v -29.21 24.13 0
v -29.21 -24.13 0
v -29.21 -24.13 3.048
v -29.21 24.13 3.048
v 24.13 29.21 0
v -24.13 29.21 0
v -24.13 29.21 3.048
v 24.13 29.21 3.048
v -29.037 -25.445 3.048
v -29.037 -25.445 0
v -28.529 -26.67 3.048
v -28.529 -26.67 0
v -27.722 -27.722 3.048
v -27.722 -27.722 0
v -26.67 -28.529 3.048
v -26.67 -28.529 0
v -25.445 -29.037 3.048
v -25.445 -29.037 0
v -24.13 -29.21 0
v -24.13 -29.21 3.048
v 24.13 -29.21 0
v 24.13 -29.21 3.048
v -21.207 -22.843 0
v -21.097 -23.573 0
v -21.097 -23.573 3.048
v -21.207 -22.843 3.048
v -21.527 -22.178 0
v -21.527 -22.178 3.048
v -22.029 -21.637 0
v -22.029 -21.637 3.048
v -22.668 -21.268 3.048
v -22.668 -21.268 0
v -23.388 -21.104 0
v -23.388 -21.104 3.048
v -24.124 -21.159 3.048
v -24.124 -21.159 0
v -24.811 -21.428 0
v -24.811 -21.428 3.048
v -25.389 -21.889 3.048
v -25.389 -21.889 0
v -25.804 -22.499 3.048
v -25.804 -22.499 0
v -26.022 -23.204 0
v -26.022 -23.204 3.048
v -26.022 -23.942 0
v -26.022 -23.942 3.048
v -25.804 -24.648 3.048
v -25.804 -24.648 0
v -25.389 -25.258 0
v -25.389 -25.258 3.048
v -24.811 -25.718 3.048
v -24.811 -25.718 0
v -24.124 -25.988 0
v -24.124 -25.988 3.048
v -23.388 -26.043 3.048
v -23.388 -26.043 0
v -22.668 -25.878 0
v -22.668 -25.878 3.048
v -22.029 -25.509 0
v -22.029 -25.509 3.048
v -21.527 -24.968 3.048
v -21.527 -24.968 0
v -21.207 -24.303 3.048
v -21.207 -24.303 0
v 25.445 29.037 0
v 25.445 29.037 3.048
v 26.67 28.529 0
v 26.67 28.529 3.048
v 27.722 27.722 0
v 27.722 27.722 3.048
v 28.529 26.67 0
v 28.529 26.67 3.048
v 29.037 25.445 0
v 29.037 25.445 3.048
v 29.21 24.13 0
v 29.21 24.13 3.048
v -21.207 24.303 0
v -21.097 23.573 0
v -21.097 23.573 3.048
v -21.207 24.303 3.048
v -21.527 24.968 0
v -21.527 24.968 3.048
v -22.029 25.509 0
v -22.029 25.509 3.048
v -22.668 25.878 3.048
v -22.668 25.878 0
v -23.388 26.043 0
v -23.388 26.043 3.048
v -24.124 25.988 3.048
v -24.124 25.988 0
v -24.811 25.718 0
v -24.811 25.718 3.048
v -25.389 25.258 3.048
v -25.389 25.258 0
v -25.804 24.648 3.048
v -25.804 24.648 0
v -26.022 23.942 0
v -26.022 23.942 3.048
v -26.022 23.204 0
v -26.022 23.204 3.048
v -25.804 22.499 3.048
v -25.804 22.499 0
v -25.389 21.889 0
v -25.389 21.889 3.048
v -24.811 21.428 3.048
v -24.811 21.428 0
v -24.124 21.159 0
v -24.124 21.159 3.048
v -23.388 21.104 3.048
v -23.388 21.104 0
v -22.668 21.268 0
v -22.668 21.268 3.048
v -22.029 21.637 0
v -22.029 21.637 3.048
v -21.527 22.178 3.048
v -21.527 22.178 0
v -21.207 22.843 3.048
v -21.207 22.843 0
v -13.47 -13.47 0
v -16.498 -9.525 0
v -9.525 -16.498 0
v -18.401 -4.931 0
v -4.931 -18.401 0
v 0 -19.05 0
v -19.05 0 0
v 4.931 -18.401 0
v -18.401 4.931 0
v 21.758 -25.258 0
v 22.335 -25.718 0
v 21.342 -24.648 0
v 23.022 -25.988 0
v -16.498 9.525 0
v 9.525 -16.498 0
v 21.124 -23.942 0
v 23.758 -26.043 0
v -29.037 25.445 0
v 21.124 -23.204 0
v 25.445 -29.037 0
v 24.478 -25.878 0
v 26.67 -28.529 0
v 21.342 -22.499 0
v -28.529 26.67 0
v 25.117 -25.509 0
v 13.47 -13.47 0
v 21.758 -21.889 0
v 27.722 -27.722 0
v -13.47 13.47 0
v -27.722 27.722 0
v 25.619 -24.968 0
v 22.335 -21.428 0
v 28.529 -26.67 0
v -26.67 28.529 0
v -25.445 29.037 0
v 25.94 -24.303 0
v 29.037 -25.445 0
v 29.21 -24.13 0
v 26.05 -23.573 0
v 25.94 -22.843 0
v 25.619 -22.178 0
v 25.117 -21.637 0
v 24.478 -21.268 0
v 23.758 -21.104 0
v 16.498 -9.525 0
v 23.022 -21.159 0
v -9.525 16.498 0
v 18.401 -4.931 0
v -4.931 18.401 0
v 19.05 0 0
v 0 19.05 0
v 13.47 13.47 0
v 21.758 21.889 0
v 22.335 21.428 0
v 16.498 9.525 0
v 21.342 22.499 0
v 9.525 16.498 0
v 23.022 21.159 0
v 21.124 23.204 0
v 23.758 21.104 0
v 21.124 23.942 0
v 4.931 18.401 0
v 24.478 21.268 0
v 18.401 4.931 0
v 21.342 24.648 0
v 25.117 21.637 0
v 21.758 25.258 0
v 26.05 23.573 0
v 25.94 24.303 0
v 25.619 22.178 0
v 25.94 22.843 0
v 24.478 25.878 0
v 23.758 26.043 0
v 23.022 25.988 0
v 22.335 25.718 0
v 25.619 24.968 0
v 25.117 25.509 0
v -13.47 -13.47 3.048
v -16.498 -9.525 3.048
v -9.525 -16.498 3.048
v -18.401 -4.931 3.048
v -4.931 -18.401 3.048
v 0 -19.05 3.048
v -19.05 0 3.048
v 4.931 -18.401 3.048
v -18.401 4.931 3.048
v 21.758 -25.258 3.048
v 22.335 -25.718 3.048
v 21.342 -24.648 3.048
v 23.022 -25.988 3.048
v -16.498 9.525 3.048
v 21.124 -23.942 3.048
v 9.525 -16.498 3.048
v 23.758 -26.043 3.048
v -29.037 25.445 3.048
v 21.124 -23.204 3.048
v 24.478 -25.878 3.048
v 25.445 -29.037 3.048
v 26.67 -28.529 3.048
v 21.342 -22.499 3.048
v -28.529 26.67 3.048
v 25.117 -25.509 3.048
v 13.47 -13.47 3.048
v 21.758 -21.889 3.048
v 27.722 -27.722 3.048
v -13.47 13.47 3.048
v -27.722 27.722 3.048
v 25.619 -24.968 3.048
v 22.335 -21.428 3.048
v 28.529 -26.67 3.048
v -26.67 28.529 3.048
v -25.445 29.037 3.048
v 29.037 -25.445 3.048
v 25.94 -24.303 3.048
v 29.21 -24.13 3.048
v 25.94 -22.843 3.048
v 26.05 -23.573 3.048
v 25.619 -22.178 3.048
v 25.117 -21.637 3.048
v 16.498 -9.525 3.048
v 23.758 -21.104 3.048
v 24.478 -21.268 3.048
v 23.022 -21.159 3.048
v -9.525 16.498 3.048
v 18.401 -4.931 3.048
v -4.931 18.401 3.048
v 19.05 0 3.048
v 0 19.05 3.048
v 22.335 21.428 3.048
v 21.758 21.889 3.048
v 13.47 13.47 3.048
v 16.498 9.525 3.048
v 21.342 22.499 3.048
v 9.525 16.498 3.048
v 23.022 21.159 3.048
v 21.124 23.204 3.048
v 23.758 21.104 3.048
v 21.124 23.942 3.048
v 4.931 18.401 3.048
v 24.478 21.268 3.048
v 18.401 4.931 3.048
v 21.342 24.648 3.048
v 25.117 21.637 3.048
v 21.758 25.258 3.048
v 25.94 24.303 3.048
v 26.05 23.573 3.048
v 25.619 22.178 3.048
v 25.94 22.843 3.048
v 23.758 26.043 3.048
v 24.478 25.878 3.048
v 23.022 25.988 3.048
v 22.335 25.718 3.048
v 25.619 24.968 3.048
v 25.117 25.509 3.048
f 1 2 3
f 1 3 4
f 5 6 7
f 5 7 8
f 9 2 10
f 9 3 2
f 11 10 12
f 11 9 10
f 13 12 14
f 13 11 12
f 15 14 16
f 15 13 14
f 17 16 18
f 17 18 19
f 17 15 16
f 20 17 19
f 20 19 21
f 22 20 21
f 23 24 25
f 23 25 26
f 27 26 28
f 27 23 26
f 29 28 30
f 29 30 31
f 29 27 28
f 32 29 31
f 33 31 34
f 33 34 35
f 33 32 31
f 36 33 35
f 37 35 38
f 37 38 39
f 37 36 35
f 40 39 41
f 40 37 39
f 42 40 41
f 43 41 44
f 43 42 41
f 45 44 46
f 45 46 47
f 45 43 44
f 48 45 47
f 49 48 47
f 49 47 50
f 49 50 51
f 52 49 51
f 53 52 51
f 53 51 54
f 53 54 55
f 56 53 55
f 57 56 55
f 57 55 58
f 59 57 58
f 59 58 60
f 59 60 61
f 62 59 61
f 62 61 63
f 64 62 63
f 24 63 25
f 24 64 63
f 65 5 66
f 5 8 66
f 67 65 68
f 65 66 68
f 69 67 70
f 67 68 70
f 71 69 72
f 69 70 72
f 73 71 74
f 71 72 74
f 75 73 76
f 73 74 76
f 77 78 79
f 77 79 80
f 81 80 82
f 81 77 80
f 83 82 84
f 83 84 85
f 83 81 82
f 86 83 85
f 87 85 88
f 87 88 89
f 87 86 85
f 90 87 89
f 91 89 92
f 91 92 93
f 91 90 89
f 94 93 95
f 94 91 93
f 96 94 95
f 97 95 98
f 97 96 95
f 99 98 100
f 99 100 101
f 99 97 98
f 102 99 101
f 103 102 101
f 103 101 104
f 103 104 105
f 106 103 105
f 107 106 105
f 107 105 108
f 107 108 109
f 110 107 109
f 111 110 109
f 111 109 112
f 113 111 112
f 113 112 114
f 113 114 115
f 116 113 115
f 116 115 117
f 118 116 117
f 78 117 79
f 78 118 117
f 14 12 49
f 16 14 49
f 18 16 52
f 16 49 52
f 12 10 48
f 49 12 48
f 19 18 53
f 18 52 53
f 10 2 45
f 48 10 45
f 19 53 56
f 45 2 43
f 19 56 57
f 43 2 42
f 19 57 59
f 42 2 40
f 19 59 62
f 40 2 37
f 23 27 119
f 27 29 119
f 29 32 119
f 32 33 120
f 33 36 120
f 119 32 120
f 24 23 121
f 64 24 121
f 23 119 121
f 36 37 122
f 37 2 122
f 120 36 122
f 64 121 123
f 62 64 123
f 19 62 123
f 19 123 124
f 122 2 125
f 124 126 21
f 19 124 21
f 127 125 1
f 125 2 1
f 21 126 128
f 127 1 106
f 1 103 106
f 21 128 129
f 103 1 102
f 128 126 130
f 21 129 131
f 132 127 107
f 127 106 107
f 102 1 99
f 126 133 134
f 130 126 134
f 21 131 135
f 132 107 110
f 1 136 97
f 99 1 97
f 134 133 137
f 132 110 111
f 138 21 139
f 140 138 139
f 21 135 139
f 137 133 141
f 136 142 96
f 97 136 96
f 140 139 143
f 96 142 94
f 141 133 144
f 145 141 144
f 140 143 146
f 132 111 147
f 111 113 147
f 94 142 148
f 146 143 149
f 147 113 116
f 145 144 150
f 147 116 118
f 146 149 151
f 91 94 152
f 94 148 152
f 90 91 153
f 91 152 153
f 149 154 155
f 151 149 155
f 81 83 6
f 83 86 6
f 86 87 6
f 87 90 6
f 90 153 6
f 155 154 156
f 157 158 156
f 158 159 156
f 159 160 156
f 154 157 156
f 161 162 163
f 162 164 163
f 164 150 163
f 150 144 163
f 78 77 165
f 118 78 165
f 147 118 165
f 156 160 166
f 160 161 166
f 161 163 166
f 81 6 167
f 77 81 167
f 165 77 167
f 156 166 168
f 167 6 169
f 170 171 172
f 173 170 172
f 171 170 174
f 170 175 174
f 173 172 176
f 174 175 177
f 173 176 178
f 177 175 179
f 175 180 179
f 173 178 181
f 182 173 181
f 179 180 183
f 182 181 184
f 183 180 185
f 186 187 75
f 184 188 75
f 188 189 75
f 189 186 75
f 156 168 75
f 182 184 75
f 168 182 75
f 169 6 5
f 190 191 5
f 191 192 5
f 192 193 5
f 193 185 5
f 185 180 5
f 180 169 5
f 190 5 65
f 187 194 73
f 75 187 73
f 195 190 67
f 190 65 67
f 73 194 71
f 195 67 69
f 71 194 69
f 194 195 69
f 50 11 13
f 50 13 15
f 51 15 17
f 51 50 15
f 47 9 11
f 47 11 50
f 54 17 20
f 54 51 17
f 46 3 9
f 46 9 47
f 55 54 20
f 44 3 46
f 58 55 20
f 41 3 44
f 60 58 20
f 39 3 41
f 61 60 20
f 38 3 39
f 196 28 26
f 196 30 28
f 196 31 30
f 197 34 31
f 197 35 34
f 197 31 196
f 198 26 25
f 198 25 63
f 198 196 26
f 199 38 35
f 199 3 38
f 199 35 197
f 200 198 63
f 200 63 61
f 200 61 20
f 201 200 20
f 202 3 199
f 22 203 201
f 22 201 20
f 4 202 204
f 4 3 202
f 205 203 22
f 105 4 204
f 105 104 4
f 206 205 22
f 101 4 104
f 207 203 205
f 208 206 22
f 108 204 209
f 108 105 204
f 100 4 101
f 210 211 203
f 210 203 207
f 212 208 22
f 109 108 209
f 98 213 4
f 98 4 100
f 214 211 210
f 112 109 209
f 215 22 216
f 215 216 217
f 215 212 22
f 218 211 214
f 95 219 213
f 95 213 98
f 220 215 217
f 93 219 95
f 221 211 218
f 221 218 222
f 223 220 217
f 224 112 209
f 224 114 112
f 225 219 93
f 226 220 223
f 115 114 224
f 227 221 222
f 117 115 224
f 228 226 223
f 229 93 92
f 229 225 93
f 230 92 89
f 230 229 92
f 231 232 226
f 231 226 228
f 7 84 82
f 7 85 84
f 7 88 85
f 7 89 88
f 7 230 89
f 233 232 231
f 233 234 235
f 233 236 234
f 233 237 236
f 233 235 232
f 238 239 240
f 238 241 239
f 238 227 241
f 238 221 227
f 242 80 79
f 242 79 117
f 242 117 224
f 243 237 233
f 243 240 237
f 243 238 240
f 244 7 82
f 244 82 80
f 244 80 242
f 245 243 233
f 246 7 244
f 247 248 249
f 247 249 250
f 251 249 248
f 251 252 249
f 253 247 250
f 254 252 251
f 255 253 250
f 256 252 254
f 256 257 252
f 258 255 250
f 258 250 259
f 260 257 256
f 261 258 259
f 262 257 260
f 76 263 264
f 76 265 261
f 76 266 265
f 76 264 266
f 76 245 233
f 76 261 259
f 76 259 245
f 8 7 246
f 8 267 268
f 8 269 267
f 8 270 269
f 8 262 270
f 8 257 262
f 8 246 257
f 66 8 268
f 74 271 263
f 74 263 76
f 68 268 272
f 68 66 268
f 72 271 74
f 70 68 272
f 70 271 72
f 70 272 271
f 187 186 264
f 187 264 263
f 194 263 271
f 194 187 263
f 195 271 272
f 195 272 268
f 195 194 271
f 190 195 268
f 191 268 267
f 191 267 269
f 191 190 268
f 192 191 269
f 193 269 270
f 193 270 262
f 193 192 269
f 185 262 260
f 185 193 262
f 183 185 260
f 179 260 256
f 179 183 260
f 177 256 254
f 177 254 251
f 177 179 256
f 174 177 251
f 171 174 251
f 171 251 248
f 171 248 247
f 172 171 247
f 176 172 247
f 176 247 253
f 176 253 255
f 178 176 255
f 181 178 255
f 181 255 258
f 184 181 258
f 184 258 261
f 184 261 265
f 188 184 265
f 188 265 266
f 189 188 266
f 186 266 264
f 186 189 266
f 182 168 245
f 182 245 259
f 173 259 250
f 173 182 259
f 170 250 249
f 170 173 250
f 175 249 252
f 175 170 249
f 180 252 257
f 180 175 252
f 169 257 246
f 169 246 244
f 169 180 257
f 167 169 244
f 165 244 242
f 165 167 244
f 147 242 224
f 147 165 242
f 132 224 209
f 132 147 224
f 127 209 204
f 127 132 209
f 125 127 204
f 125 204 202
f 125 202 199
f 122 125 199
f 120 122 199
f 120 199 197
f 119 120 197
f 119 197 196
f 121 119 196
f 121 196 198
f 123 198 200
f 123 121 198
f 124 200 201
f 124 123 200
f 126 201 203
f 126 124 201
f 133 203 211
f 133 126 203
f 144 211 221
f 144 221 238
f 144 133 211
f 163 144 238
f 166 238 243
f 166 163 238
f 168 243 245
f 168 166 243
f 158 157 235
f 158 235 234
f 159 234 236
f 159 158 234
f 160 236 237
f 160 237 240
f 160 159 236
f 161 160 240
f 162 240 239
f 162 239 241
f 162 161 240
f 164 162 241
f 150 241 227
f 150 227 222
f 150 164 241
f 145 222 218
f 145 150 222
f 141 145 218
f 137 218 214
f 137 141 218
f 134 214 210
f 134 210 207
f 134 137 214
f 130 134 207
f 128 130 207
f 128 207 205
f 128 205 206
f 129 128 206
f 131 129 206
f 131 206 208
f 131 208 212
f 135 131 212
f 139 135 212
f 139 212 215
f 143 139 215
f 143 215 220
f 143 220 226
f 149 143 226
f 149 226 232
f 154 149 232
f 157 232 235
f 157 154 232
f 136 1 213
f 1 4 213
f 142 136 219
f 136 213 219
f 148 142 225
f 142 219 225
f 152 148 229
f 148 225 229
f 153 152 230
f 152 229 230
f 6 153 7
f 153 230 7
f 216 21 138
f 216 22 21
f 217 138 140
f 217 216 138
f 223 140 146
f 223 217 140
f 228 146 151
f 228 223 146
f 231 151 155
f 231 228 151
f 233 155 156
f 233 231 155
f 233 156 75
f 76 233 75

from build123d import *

# Parameters (mm, degrees)
F0_W     = 58.42
F0_H     = 58.42
F0_R     = 2.4765
F0_R_2   = 19.05
F1_DEPTH = 3.048
F2_R     = 5.08
F3_R     = 5.08


with BuildPart() as f1:
    # F0 (on Top) → F1 (new body)
    with BuildSketch(Plane.XY):
        Rectangle(F0_W, F0_H)
        with Locations((-23.573172, -23.573172)):
            Circle(F0_R, mode=Mode.SUBTRACT)
        Circle(F0_R_2, mode=Mode.SUBTRACT)
        with Locations((23.573172, -23.573172)):
            Circle(F0_R, mode=Mode.SUBTRACT)
        with Locations((-23.573172, 23.573172)):
            Circle(F0_R, mode=Mode.SUBTRACT)
        with Locations((23.573172, 23.573172)):
            Circle(F0_R, mode=Mode.SUBTRACT)
    extrude(amount=F1_DEPTH)

    # F2
    f2_edges = [f1.edges().sort_by_distance(p)[0] for p in [
        (-29.21, 29.21, 1.524),
    ]]
    fillet(f2_edges, radius=F2_R)

    # F3
    f3_edges = [f1.edges().sort_by_distance(p)[0] for p in [
        (29.21, 29.21, 1.524),
        (29.21, -29.21, 1.524),
        (-29.21, -29.21, 1.524),
    ]]
    fillet(f3_edges, radius=F3_R)


solid = f1.part
